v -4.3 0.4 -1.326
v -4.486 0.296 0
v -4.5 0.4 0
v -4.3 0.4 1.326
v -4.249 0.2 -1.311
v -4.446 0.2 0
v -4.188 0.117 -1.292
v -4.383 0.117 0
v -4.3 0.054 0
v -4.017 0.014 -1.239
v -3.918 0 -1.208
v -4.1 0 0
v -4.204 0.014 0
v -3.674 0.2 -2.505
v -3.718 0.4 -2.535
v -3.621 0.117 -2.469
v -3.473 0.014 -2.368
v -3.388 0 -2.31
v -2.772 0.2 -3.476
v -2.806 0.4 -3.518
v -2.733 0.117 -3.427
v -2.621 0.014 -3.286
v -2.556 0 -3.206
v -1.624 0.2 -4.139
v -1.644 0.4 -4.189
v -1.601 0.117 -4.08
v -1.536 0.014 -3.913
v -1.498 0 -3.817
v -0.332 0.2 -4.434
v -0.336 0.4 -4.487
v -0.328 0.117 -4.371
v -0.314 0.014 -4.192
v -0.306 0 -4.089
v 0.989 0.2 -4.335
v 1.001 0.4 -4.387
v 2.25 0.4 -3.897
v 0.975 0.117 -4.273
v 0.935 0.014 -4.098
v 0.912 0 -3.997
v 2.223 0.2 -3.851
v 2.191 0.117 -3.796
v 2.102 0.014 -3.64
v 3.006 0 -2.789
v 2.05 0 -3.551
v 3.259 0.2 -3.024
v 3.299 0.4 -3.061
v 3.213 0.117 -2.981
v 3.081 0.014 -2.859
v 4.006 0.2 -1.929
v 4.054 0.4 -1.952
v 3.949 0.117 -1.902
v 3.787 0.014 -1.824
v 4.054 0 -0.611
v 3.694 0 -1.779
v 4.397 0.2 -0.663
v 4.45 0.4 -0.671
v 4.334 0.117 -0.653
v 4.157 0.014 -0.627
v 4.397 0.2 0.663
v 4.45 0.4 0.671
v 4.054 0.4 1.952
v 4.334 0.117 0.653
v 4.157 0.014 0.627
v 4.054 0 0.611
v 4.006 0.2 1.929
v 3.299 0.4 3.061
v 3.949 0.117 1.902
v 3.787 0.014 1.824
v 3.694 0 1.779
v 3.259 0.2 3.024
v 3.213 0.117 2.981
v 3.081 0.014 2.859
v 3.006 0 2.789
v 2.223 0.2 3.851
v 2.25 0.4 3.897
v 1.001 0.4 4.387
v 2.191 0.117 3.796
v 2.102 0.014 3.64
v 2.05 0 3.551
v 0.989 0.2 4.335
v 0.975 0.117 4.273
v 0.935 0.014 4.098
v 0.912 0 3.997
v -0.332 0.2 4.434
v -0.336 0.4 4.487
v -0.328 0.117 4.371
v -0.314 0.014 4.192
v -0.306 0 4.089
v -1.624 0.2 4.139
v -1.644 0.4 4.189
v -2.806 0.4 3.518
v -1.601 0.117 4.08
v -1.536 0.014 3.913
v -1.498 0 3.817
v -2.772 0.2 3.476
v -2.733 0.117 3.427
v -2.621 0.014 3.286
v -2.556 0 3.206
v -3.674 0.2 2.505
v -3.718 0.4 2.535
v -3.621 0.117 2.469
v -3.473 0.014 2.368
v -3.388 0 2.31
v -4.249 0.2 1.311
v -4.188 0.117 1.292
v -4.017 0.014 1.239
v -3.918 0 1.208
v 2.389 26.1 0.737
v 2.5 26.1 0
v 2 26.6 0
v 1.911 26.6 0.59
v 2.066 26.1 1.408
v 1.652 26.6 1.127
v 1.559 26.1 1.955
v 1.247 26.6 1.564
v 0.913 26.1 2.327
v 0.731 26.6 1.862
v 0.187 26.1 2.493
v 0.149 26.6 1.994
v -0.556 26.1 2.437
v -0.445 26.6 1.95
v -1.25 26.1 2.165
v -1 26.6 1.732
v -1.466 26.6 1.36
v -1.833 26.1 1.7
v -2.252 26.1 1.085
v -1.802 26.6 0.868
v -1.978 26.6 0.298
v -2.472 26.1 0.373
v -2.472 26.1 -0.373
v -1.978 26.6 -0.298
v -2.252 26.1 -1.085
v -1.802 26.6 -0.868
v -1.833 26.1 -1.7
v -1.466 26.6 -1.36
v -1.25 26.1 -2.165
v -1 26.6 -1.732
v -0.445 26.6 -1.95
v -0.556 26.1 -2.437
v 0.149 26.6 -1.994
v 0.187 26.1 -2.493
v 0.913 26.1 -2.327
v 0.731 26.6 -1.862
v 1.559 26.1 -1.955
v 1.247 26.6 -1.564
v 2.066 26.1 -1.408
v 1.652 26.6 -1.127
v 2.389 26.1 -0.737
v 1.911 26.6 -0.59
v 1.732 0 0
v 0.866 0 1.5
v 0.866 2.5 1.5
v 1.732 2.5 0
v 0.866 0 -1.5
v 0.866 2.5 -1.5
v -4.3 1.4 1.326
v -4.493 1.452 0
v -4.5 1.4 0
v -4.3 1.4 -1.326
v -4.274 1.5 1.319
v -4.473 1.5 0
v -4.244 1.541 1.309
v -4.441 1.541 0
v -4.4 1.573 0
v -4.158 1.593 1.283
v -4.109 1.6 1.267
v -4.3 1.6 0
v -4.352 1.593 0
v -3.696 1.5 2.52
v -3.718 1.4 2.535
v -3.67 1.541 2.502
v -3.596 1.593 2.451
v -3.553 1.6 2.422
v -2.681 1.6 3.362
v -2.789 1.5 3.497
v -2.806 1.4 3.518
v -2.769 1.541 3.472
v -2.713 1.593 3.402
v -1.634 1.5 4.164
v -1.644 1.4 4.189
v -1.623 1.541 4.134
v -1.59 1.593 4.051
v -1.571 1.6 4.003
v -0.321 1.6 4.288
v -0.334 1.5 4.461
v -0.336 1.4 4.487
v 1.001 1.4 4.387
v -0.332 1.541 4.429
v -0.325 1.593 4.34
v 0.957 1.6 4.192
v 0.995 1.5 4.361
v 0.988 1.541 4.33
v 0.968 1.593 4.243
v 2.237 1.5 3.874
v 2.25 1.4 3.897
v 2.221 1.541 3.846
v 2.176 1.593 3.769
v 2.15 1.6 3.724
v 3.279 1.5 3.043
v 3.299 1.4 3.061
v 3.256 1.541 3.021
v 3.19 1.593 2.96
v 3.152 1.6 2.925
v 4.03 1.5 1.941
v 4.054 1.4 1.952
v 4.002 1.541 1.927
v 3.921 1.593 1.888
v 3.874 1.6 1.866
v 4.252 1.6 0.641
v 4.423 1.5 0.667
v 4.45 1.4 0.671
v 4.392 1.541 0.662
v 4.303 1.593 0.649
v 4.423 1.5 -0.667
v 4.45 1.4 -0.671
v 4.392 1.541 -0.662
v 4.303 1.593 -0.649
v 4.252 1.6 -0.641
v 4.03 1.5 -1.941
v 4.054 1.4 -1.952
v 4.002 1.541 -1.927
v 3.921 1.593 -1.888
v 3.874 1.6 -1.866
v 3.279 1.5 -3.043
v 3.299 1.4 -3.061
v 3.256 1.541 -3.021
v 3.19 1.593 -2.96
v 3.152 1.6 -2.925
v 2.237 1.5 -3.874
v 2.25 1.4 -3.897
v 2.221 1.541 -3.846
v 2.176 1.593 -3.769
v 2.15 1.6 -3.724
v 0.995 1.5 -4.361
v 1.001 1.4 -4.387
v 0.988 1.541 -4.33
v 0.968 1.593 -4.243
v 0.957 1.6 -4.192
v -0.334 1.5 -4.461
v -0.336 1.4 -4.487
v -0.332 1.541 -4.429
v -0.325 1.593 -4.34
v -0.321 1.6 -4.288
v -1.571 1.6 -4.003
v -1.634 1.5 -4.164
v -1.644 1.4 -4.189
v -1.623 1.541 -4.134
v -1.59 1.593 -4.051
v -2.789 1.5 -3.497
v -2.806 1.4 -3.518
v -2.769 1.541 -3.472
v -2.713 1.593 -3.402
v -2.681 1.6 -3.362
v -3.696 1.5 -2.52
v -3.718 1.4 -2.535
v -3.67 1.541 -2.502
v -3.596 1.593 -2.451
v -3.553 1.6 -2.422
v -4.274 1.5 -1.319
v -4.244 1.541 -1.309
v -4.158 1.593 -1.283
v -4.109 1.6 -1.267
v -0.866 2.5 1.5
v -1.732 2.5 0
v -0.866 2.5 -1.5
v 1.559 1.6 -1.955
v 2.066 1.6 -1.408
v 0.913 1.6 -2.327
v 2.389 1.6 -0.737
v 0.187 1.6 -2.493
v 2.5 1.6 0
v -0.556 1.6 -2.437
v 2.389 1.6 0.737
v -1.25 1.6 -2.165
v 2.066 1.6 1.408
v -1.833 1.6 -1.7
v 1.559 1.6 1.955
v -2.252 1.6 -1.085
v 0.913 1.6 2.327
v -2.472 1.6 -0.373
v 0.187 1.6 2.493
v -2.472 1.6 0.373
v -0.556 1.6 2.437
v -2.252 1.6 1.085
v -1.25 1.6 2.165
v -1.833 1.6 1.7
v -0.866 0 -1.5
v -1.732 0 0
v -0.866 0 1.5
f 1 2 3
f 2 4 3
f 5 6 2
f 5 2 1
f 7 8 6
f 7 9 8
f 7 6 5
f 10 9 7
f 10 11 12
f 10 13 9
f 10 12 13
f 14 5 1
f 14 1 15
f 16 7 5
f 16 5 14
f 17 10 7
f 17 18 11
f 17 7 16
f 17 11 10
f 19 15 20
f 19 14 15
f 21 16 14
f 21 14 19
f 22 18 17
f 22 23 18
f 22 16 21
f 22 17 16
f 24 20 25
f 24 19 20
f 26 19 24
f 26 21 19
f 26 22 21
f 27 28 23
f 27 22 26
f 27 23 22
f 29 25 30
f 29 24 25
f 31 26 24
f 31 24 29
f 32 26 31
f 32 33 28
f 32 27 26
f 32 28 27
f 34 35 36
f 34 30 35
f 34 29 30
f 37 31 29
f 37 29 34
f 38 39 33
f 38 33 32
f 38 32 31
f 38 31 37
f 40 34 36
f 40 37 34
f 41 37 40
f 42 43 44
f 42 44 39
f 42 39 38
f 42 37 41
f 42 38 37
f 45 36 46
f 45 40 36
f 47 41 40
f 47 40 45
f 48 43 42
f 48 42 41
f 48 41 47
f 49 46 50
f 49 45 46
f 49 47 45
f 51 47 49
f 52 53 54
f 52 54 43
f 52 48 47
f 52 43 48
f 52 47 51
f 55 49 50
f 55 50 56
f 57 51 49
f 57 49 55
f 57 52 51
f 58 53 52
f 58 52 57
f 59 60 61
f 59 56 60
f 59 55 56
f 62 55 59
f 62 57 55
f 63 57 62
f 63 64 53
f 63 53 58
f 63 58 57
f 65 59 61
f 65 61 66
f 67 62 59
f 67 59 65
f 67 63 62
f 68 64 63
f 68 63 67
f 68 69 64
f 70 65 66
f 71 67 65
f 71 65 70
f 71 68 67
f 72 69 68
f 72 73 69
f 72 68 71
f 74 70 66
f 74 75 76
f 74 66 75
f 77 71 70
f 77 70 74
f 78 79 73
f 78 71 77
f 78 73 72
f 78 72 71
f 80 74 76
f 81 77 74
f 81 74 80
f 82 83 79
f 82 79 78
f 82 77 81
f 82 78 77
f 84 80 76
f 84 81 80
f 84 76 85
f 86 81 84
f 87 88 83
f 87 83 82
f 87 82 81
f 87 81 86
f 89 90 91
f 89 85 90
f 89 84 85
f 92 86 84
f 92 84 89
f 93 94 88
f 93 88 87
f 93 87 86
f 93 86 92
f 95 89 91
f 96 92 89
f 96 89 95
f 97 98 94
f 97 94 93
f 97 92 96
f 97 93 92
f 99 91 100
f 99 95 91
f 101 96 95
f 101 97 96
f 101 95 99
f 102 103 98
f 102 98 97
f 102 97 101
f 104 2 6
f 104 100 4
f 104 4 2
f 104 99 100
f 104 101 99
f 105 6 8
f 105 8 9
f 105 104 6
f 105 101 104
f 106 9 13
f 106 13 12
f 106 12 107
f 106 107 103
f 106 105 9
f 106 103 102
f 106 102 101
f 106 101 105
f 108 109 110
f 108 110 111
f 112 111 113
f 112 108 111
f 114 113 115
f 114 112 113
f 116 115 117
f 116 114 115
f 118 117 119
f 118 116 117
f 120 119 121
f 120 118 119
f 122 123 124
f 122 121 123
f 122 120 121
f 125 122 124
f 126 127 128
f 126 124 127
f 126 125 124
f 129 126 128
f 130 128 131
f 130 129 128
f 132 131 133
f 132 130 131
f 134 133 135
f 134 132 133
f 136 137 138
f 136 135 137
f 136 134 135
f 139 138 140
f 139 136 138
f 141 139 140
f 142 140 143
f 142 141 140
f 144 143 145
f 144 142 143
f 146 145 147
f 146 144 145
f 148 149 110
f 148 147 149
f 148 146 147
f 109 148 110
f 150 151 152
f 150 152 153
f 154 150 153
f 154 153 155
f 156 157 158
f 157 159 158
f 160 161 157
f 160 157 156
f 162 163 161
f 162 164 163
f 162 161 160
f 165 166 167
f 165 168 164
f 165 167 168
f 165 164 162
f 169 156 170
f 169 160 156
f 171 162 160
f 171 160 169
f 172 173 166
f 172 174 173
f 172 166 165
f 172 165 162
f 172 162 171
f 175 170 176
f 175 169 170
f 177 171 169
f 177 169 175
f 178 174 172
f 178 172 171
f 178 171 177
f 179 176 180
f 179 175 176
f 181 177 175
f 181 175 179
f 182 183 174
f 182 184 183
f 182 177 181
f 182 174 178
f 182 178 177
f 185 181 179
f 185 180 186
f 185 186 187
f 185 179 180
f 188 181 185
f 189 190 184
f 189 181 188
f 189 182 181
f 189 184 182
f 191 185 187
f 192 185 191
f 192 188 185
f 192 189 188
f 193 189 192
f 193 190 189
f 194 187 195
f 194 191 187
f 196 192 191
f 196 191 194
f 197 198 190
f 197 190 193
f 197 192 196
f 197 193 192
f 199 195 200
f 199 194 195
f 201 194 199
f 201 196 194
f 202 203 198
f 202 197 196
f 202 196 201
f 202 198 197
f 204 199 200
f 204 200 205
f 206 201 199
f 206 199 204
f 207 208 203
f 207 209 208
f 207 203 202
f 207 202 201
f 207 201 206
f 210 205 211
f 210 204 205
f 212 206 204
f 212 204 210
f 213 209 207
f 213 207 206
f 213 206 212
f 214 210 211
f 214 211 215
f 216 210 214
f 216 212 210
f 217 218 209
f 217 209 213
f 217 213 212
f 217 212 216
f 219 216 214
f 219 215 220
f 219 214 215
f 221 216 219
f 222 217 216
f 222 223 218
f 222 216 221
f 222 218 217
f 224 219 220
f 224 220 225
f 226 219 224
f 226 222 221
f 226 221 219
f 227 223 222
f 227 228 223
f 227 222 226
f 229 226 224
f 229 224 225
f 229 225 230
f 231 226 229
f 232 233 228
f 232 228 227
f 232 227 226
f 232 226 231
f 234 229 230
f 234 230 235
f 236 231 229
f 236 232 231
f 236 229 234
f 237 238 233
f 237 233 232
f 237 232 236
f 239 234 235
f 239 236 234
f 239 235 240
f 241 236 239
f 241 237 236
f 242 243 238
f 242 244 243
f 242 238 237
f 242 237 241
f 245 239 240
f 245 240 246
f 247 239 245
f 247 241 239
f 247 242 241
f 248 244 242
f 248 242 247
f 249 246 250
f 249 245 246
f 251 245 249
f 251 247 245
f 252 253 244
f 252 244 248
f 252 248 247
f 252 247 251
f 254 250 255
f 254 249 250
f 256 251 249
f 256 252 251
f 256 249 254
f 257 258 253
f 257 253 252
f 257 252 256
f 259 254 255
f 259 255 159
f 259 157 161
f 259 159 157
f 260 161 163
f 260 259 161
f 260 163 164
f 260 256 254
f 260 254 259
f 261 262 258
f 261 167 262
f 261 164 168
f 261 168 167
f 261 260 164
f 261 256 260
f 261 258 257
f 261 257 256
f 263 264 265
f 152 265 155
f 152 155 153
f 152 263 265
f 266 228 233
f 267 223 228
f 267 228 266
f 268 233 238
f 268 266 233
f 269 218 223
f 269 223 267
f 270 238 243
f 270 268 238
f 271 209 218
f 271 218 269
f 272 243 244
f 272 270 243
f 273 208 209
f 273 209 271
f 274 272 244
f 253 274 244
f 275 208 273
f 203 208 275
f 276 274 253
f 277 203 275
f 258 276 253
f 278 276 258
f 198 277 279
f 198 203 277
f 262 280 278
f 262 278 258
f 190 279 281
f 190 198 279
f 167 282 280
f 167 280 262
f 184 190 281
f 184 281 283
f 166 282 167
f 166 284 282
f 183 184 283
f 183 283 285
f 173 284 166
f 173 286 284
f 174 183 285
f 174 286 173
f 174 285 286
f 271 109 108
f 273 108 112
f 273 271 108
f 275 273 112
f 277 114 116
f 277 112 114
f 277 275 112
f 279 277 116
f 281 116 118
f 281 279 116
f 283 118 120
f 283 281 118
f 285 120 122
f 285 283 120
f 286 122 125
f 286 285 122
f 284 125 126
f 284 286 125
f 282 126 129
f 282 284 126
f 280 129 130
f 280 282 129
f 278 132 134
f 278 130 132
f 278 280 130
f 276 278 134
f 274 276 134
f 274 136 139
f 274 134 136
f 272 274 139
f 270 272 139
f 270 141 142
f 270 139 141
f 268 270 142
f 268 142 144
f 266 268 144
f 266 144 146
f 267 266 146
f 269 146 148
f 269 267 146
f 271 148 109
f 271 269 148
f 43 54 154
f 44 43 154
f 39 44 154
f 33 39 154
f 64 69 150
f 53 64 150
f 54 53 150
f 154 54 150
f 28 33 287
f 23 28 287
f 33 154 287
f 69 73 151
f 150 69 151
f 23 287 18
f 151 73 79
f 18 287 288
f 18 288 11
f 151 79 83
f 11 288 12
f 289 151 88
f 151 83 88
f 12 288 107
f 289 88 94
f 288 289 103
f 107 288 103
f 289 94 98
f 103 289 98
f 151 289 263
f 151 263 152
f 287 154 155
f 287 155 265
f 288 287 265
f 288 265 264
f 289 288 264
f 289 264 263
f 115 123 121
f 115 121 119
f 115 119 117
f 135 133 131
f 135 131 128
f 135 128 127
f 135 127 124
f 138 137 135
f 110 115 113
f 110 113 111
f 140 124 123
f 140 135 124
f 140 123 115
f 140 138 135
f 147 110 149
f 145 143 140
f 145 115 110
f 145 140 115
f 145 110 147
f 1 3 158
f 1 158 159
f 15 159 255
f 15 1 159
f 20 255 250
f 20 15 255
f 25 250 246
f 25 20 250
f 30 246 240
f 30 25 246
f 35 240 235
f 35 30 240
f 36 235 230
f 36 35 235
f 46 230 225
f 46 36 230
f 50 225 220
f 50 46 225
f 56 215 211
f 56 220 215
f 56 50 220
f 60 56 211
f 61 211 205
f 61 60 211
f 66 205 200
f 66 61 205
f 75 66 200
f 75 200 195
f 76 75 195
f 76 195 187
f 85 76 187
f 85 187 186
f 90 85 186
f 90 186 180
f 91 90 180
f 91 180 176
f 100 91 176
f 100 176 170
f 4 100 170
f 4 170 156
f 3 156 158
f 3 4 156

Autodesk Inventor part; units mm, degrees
ref_plane "YZ Plane" through (0, 0, 0) normal (1, 0, 0) x (0, 1, 0)
ref_plane "XZ Plane" through (0, 0, 0) normal (0, 1, 0) x (-1, 0, 0)
ref_plane "XY Plane" through (0, 0, 0) normal (0, 0, 1) x (1, 0, 0)
sketch "Boceto1" plane through (0, 0, 0) normal (0, 1, 0) x (-1, 0, 0)
  circle A0 centre (0, 0) radius 4.5
  dimension "d0" = 9
extrude "Extrusión1" add sketch "Boceto1" along normal blind 1.6
sketch "Boceto2" plane through (0, 1.6, 0) normal (0, 1, 0) x (1, 0, 0)
  circle A0 centre (0, 0) radius 2.5
  dimension "d3" = 5
extrude "Extrusión2" add sketch "Boceto2" along normal blind 25
fillet "Empalme1" radius 0.4 1 edges at (4.5, 0, 0)
fillet "Empalme2" radius 0.2 1 edges at (4.5, 1.6, 0)
sketch "Boceto3" plane through (0, 0, 0) normal (0, -1, 0) x (1, 0, 0)
  line L0 (-1.7321, 0) -> (-0.866, 1.5)
  line L1 (-0.866, 1.5) -> (0.866, 1.5)
  line L2 (0.866, 1.5) -> (1.7321, 0)
  line L3 (1.7321, 0) -> (0.866, -1.5)
  line L4 (0.866, -1.5) -> (-0.866, -1.5)
  line L5 (-0.866, -1.5) -> (-1.7321, 0)
  point P0 (0, 0)
  point P1 (0, 0)
  dimension "d8" = 3
extrude "Extrusión3" cut sketch "Boceto3" against normal blind 2.5
chamfer "Chaflán1" distance 0.5 angle 45 1 edges at (-2.5, 26.6, 0)
thread "Rosca2" size "M5x0.8" class "6g" standard "ANSI Metric M Profile" length 23 offset 2
properties part number "Perno M5x8 cabeza plana" material "Hierro, gris"
